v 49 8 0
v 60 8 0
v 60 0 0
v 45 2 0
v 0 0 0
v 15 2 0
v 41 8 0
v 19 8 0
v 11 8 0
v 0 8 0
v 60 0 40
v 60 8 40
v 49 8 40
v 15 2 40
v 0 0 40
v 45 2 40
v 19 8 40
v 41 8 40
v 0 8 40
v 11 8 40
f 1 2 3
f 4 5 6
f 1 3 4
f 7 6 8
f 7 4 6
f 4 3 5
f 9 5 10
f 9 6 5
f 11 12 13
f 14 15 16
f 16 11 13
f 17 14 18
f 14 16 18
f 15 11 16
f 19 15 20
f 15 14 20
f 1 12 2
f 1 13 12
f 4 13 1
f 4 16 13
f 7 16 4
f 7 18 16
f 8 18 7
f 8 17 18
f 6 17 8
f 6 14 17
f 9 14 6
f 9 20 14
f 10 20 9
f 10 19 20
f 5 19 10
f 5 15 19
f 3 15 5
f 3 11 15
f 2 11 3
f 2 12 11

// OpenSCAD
$fn = 32;

// ----------------------------------------------------------------------
// V guide rail: doublev, 60 mm wide
// ----------------------------------------------------------------------

// --- parameters (mm) ---
rail_w = 60;              // rail width, X
base_t = 8;               // base plate thickness
v_depth = 6;              // V feature depth / height
v_half_w = 8;             // half width of the V at the base face
plate_t = 40;             // rail length, Z (the extrusion height)
groove_off = 15;          // offset of each groove from the centreline

centre_x = rail_w / 2;  // rail centreline
groove_a = centre_x - groove_off;  // axis of the first groove
groove_b = centre_x + groove_off;  // axis of the second groove

profile = [[0, 0], [60, 0], [60, 8], [49, 8], [45, 2], [41, 8], [19, 8], [15, 2], [11, 8], [0, 8]];  // primary outline, 10 points, counter clockwise

// --- the one profile operation ---
linear_extrude(height = plate_t) polygon(points = profile);
